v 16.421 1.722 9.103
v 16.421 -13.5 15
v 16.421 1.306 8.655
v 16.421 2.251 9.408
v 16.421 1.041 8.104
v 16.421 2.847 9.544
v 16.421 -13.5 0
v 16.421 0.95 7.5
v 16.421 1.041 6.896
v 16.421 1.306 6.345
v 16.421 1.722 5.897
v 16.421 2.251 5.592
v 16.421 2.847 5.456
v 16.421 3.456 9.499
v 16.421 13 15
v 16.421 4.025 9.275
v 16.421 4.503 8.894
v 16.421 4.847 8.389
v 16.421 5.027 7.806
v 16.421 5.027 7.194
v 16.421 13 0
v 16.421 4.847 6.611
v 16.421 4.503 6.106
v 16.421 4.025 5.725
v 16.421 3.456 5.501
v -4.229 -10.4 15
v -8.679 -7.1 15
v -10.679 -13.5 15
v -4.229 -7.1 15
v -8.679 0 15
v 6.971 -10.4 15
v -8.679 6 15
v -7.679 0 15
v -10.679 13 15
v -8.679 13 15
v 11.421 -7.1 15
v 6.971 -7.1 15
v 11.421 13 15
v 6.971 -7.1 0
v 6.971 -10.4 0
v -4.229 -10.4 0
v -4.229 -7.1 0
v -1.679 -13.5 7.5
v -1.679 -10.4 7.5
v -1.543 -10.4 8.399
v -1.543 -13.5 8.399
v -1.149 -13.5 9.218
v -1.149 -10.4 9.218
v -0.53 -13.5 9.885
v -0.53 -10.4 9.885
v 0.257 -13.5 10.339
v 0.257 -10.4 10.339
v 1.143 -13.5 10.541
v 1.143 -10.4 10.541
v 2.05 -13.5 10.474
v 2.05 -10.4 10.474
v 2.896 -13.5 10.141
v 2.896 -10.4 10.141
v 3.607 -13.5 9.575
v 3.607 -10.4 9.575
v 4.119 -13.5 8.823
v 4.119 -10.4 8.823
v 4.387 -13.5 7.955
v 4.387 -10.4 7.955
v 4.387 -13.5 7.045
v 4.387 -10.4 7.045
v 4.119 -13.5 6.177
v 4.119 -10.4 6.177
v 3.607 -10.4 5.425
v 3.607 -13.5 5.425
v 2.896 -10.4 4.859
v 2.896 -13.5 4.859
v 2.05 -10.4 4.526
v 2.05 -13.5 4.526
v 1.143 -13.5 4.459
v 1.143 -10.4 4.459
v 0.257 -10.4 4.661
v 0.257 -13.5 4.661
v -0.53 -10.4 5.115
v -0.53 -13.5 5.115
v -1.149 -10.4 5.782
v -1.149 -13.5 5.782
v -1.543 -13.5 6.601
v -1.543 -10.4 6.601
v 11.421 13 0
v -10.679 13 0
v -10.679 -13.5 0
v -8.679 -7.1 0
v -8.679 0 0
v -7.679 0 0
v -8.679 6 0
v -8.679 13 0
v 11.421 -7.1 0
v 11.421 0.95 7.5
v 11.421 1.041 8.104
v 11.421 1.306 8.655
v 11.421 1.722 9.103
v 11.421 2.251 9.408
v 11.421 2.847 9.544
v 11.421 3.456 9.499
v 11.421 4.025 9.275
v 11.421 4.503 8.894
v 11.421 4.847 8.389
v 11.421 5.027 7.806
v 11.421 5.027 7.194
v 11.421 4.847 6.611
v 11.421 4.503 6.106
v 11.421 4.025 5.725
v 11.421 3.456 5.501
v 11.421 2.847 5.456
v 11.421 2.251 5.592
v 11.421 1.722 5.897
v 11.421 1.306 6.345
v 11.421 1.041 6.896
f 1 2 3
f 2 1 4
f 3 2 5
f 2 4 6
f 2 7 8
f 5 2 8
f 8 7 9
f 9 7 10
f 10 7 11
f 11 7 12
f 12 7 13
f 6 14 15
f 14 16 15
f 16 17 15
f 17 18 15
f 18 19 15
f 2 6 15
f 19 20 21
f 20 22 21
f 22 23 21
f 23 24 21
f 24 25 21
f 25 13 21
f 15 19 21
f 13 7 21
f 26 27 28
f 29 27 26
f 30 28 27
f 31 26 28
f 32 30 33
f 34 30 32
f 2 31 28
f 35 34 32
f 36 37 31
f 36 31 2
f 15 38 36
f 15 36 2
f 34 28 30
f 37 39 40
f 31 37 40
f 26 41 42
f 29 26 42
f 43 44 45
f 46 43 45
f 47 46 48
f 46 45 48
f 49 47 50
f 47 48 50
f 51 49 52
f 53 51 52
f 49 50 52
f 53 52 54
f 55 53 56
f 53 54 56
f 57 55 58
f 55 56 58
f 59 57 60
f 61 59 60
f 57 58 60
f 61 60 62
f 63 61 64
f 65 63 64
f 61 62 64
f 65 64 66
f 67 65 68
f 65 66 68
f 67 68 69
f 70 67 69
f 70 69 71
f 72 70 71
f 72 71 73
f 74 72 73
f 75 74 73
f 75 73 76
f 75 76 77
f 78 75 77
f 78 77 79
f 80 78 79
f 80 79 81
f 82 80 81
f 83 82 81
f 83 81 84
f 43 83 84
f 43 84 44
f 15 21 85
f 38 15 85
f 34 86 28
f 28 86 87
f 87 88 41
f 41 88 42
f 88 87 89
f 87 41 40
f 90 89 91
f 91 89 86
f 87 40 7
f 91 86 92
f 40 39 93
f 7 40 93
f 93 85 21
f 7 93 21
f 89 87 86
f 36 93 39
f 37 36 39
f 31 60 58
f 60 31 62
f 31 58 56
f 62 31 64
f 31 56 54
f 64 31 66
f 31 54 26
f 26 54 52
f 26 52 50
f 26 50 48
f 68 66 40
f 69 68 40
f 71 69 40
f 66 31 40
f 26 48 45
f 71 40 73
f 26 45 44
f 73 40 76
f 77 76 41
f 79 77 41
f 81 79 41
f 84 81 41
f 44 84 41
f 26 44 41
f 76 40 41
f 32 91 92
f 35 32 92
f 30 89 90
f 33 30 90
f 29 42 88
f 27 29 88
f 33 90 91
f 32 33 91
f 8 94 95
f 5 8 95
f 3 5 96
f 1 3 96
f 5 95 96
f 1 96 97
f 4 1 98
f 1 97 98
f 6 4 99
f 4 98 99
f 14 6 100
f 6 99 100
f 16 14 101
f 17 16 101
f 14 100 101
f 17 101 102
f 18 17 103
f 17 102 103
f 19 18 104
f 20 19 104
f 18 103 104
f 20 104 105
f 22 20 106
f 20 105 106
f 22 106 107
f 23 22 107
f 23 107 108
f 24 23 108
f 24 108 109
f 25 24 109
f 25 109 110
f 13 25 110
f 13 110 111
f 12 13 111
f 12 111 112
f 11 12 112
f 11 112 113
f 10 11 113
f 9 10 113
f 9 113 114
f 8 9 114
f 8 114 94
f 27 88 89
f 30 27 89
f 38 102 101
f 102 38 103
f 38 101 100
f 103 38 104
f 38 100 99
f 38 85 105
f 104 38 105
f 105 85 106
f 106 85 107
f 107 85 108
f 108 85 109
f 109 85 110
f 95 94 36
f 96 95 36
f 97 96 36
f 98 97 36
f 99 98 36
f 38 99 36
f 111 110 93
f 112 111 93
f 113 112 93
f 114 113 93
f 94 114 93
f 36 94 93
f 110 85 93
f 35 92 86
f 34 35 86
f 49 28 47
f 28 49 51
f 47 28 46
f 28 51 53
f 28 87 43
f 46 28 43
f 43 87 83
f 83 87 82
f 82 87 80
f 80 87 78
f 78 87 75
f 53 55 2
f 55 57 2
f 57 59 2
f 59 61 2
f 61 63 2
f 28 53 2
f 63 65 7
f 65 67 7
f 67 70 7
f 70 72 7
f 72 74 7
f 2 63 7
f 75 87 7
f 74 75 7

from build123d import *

# Parameters (mm, degrees)
F1_DEPTH = 15
F4_D     = 4.1
F4_DEPTH = 7
F5_D     = 6.1
F5_DEPTH = 7


with BuildPart() as f1:
    # F0 (on Top) → F1 (new body)
    with BuildSketch(Plane.XY):
        Polygon((-8.678603, 13), (-10.678603, 13), (-10.678603, -13.5), (16.421397, -13.5), (16.421397, 13), (11.421397, 13), (11.421397, -7.1), (6.971397, -7.1), (6.971397, -10.4), (-4.228603, -10.4), (-4.228603, -7.1), (-8.678603, -7.1), (-8.678603, 0), (-7.678603, 0), (-8.678603, 6), align=None)
    extrude(amount=F1_DEPTH)

    # F4
    with Locations(Plane.YZ.offset(16.421397)):
        with Locations((3, 7.5)):
            Hole(F4_D / 2, depth=F4_DEPTH)

    # F5
    with Locations(Plane.XZ.offset(13.5)):
        with Locations((1.371397, 7.5)):
            Hole(F5_D / 2, depth=F5_DEPTH)


solid = f1.part
